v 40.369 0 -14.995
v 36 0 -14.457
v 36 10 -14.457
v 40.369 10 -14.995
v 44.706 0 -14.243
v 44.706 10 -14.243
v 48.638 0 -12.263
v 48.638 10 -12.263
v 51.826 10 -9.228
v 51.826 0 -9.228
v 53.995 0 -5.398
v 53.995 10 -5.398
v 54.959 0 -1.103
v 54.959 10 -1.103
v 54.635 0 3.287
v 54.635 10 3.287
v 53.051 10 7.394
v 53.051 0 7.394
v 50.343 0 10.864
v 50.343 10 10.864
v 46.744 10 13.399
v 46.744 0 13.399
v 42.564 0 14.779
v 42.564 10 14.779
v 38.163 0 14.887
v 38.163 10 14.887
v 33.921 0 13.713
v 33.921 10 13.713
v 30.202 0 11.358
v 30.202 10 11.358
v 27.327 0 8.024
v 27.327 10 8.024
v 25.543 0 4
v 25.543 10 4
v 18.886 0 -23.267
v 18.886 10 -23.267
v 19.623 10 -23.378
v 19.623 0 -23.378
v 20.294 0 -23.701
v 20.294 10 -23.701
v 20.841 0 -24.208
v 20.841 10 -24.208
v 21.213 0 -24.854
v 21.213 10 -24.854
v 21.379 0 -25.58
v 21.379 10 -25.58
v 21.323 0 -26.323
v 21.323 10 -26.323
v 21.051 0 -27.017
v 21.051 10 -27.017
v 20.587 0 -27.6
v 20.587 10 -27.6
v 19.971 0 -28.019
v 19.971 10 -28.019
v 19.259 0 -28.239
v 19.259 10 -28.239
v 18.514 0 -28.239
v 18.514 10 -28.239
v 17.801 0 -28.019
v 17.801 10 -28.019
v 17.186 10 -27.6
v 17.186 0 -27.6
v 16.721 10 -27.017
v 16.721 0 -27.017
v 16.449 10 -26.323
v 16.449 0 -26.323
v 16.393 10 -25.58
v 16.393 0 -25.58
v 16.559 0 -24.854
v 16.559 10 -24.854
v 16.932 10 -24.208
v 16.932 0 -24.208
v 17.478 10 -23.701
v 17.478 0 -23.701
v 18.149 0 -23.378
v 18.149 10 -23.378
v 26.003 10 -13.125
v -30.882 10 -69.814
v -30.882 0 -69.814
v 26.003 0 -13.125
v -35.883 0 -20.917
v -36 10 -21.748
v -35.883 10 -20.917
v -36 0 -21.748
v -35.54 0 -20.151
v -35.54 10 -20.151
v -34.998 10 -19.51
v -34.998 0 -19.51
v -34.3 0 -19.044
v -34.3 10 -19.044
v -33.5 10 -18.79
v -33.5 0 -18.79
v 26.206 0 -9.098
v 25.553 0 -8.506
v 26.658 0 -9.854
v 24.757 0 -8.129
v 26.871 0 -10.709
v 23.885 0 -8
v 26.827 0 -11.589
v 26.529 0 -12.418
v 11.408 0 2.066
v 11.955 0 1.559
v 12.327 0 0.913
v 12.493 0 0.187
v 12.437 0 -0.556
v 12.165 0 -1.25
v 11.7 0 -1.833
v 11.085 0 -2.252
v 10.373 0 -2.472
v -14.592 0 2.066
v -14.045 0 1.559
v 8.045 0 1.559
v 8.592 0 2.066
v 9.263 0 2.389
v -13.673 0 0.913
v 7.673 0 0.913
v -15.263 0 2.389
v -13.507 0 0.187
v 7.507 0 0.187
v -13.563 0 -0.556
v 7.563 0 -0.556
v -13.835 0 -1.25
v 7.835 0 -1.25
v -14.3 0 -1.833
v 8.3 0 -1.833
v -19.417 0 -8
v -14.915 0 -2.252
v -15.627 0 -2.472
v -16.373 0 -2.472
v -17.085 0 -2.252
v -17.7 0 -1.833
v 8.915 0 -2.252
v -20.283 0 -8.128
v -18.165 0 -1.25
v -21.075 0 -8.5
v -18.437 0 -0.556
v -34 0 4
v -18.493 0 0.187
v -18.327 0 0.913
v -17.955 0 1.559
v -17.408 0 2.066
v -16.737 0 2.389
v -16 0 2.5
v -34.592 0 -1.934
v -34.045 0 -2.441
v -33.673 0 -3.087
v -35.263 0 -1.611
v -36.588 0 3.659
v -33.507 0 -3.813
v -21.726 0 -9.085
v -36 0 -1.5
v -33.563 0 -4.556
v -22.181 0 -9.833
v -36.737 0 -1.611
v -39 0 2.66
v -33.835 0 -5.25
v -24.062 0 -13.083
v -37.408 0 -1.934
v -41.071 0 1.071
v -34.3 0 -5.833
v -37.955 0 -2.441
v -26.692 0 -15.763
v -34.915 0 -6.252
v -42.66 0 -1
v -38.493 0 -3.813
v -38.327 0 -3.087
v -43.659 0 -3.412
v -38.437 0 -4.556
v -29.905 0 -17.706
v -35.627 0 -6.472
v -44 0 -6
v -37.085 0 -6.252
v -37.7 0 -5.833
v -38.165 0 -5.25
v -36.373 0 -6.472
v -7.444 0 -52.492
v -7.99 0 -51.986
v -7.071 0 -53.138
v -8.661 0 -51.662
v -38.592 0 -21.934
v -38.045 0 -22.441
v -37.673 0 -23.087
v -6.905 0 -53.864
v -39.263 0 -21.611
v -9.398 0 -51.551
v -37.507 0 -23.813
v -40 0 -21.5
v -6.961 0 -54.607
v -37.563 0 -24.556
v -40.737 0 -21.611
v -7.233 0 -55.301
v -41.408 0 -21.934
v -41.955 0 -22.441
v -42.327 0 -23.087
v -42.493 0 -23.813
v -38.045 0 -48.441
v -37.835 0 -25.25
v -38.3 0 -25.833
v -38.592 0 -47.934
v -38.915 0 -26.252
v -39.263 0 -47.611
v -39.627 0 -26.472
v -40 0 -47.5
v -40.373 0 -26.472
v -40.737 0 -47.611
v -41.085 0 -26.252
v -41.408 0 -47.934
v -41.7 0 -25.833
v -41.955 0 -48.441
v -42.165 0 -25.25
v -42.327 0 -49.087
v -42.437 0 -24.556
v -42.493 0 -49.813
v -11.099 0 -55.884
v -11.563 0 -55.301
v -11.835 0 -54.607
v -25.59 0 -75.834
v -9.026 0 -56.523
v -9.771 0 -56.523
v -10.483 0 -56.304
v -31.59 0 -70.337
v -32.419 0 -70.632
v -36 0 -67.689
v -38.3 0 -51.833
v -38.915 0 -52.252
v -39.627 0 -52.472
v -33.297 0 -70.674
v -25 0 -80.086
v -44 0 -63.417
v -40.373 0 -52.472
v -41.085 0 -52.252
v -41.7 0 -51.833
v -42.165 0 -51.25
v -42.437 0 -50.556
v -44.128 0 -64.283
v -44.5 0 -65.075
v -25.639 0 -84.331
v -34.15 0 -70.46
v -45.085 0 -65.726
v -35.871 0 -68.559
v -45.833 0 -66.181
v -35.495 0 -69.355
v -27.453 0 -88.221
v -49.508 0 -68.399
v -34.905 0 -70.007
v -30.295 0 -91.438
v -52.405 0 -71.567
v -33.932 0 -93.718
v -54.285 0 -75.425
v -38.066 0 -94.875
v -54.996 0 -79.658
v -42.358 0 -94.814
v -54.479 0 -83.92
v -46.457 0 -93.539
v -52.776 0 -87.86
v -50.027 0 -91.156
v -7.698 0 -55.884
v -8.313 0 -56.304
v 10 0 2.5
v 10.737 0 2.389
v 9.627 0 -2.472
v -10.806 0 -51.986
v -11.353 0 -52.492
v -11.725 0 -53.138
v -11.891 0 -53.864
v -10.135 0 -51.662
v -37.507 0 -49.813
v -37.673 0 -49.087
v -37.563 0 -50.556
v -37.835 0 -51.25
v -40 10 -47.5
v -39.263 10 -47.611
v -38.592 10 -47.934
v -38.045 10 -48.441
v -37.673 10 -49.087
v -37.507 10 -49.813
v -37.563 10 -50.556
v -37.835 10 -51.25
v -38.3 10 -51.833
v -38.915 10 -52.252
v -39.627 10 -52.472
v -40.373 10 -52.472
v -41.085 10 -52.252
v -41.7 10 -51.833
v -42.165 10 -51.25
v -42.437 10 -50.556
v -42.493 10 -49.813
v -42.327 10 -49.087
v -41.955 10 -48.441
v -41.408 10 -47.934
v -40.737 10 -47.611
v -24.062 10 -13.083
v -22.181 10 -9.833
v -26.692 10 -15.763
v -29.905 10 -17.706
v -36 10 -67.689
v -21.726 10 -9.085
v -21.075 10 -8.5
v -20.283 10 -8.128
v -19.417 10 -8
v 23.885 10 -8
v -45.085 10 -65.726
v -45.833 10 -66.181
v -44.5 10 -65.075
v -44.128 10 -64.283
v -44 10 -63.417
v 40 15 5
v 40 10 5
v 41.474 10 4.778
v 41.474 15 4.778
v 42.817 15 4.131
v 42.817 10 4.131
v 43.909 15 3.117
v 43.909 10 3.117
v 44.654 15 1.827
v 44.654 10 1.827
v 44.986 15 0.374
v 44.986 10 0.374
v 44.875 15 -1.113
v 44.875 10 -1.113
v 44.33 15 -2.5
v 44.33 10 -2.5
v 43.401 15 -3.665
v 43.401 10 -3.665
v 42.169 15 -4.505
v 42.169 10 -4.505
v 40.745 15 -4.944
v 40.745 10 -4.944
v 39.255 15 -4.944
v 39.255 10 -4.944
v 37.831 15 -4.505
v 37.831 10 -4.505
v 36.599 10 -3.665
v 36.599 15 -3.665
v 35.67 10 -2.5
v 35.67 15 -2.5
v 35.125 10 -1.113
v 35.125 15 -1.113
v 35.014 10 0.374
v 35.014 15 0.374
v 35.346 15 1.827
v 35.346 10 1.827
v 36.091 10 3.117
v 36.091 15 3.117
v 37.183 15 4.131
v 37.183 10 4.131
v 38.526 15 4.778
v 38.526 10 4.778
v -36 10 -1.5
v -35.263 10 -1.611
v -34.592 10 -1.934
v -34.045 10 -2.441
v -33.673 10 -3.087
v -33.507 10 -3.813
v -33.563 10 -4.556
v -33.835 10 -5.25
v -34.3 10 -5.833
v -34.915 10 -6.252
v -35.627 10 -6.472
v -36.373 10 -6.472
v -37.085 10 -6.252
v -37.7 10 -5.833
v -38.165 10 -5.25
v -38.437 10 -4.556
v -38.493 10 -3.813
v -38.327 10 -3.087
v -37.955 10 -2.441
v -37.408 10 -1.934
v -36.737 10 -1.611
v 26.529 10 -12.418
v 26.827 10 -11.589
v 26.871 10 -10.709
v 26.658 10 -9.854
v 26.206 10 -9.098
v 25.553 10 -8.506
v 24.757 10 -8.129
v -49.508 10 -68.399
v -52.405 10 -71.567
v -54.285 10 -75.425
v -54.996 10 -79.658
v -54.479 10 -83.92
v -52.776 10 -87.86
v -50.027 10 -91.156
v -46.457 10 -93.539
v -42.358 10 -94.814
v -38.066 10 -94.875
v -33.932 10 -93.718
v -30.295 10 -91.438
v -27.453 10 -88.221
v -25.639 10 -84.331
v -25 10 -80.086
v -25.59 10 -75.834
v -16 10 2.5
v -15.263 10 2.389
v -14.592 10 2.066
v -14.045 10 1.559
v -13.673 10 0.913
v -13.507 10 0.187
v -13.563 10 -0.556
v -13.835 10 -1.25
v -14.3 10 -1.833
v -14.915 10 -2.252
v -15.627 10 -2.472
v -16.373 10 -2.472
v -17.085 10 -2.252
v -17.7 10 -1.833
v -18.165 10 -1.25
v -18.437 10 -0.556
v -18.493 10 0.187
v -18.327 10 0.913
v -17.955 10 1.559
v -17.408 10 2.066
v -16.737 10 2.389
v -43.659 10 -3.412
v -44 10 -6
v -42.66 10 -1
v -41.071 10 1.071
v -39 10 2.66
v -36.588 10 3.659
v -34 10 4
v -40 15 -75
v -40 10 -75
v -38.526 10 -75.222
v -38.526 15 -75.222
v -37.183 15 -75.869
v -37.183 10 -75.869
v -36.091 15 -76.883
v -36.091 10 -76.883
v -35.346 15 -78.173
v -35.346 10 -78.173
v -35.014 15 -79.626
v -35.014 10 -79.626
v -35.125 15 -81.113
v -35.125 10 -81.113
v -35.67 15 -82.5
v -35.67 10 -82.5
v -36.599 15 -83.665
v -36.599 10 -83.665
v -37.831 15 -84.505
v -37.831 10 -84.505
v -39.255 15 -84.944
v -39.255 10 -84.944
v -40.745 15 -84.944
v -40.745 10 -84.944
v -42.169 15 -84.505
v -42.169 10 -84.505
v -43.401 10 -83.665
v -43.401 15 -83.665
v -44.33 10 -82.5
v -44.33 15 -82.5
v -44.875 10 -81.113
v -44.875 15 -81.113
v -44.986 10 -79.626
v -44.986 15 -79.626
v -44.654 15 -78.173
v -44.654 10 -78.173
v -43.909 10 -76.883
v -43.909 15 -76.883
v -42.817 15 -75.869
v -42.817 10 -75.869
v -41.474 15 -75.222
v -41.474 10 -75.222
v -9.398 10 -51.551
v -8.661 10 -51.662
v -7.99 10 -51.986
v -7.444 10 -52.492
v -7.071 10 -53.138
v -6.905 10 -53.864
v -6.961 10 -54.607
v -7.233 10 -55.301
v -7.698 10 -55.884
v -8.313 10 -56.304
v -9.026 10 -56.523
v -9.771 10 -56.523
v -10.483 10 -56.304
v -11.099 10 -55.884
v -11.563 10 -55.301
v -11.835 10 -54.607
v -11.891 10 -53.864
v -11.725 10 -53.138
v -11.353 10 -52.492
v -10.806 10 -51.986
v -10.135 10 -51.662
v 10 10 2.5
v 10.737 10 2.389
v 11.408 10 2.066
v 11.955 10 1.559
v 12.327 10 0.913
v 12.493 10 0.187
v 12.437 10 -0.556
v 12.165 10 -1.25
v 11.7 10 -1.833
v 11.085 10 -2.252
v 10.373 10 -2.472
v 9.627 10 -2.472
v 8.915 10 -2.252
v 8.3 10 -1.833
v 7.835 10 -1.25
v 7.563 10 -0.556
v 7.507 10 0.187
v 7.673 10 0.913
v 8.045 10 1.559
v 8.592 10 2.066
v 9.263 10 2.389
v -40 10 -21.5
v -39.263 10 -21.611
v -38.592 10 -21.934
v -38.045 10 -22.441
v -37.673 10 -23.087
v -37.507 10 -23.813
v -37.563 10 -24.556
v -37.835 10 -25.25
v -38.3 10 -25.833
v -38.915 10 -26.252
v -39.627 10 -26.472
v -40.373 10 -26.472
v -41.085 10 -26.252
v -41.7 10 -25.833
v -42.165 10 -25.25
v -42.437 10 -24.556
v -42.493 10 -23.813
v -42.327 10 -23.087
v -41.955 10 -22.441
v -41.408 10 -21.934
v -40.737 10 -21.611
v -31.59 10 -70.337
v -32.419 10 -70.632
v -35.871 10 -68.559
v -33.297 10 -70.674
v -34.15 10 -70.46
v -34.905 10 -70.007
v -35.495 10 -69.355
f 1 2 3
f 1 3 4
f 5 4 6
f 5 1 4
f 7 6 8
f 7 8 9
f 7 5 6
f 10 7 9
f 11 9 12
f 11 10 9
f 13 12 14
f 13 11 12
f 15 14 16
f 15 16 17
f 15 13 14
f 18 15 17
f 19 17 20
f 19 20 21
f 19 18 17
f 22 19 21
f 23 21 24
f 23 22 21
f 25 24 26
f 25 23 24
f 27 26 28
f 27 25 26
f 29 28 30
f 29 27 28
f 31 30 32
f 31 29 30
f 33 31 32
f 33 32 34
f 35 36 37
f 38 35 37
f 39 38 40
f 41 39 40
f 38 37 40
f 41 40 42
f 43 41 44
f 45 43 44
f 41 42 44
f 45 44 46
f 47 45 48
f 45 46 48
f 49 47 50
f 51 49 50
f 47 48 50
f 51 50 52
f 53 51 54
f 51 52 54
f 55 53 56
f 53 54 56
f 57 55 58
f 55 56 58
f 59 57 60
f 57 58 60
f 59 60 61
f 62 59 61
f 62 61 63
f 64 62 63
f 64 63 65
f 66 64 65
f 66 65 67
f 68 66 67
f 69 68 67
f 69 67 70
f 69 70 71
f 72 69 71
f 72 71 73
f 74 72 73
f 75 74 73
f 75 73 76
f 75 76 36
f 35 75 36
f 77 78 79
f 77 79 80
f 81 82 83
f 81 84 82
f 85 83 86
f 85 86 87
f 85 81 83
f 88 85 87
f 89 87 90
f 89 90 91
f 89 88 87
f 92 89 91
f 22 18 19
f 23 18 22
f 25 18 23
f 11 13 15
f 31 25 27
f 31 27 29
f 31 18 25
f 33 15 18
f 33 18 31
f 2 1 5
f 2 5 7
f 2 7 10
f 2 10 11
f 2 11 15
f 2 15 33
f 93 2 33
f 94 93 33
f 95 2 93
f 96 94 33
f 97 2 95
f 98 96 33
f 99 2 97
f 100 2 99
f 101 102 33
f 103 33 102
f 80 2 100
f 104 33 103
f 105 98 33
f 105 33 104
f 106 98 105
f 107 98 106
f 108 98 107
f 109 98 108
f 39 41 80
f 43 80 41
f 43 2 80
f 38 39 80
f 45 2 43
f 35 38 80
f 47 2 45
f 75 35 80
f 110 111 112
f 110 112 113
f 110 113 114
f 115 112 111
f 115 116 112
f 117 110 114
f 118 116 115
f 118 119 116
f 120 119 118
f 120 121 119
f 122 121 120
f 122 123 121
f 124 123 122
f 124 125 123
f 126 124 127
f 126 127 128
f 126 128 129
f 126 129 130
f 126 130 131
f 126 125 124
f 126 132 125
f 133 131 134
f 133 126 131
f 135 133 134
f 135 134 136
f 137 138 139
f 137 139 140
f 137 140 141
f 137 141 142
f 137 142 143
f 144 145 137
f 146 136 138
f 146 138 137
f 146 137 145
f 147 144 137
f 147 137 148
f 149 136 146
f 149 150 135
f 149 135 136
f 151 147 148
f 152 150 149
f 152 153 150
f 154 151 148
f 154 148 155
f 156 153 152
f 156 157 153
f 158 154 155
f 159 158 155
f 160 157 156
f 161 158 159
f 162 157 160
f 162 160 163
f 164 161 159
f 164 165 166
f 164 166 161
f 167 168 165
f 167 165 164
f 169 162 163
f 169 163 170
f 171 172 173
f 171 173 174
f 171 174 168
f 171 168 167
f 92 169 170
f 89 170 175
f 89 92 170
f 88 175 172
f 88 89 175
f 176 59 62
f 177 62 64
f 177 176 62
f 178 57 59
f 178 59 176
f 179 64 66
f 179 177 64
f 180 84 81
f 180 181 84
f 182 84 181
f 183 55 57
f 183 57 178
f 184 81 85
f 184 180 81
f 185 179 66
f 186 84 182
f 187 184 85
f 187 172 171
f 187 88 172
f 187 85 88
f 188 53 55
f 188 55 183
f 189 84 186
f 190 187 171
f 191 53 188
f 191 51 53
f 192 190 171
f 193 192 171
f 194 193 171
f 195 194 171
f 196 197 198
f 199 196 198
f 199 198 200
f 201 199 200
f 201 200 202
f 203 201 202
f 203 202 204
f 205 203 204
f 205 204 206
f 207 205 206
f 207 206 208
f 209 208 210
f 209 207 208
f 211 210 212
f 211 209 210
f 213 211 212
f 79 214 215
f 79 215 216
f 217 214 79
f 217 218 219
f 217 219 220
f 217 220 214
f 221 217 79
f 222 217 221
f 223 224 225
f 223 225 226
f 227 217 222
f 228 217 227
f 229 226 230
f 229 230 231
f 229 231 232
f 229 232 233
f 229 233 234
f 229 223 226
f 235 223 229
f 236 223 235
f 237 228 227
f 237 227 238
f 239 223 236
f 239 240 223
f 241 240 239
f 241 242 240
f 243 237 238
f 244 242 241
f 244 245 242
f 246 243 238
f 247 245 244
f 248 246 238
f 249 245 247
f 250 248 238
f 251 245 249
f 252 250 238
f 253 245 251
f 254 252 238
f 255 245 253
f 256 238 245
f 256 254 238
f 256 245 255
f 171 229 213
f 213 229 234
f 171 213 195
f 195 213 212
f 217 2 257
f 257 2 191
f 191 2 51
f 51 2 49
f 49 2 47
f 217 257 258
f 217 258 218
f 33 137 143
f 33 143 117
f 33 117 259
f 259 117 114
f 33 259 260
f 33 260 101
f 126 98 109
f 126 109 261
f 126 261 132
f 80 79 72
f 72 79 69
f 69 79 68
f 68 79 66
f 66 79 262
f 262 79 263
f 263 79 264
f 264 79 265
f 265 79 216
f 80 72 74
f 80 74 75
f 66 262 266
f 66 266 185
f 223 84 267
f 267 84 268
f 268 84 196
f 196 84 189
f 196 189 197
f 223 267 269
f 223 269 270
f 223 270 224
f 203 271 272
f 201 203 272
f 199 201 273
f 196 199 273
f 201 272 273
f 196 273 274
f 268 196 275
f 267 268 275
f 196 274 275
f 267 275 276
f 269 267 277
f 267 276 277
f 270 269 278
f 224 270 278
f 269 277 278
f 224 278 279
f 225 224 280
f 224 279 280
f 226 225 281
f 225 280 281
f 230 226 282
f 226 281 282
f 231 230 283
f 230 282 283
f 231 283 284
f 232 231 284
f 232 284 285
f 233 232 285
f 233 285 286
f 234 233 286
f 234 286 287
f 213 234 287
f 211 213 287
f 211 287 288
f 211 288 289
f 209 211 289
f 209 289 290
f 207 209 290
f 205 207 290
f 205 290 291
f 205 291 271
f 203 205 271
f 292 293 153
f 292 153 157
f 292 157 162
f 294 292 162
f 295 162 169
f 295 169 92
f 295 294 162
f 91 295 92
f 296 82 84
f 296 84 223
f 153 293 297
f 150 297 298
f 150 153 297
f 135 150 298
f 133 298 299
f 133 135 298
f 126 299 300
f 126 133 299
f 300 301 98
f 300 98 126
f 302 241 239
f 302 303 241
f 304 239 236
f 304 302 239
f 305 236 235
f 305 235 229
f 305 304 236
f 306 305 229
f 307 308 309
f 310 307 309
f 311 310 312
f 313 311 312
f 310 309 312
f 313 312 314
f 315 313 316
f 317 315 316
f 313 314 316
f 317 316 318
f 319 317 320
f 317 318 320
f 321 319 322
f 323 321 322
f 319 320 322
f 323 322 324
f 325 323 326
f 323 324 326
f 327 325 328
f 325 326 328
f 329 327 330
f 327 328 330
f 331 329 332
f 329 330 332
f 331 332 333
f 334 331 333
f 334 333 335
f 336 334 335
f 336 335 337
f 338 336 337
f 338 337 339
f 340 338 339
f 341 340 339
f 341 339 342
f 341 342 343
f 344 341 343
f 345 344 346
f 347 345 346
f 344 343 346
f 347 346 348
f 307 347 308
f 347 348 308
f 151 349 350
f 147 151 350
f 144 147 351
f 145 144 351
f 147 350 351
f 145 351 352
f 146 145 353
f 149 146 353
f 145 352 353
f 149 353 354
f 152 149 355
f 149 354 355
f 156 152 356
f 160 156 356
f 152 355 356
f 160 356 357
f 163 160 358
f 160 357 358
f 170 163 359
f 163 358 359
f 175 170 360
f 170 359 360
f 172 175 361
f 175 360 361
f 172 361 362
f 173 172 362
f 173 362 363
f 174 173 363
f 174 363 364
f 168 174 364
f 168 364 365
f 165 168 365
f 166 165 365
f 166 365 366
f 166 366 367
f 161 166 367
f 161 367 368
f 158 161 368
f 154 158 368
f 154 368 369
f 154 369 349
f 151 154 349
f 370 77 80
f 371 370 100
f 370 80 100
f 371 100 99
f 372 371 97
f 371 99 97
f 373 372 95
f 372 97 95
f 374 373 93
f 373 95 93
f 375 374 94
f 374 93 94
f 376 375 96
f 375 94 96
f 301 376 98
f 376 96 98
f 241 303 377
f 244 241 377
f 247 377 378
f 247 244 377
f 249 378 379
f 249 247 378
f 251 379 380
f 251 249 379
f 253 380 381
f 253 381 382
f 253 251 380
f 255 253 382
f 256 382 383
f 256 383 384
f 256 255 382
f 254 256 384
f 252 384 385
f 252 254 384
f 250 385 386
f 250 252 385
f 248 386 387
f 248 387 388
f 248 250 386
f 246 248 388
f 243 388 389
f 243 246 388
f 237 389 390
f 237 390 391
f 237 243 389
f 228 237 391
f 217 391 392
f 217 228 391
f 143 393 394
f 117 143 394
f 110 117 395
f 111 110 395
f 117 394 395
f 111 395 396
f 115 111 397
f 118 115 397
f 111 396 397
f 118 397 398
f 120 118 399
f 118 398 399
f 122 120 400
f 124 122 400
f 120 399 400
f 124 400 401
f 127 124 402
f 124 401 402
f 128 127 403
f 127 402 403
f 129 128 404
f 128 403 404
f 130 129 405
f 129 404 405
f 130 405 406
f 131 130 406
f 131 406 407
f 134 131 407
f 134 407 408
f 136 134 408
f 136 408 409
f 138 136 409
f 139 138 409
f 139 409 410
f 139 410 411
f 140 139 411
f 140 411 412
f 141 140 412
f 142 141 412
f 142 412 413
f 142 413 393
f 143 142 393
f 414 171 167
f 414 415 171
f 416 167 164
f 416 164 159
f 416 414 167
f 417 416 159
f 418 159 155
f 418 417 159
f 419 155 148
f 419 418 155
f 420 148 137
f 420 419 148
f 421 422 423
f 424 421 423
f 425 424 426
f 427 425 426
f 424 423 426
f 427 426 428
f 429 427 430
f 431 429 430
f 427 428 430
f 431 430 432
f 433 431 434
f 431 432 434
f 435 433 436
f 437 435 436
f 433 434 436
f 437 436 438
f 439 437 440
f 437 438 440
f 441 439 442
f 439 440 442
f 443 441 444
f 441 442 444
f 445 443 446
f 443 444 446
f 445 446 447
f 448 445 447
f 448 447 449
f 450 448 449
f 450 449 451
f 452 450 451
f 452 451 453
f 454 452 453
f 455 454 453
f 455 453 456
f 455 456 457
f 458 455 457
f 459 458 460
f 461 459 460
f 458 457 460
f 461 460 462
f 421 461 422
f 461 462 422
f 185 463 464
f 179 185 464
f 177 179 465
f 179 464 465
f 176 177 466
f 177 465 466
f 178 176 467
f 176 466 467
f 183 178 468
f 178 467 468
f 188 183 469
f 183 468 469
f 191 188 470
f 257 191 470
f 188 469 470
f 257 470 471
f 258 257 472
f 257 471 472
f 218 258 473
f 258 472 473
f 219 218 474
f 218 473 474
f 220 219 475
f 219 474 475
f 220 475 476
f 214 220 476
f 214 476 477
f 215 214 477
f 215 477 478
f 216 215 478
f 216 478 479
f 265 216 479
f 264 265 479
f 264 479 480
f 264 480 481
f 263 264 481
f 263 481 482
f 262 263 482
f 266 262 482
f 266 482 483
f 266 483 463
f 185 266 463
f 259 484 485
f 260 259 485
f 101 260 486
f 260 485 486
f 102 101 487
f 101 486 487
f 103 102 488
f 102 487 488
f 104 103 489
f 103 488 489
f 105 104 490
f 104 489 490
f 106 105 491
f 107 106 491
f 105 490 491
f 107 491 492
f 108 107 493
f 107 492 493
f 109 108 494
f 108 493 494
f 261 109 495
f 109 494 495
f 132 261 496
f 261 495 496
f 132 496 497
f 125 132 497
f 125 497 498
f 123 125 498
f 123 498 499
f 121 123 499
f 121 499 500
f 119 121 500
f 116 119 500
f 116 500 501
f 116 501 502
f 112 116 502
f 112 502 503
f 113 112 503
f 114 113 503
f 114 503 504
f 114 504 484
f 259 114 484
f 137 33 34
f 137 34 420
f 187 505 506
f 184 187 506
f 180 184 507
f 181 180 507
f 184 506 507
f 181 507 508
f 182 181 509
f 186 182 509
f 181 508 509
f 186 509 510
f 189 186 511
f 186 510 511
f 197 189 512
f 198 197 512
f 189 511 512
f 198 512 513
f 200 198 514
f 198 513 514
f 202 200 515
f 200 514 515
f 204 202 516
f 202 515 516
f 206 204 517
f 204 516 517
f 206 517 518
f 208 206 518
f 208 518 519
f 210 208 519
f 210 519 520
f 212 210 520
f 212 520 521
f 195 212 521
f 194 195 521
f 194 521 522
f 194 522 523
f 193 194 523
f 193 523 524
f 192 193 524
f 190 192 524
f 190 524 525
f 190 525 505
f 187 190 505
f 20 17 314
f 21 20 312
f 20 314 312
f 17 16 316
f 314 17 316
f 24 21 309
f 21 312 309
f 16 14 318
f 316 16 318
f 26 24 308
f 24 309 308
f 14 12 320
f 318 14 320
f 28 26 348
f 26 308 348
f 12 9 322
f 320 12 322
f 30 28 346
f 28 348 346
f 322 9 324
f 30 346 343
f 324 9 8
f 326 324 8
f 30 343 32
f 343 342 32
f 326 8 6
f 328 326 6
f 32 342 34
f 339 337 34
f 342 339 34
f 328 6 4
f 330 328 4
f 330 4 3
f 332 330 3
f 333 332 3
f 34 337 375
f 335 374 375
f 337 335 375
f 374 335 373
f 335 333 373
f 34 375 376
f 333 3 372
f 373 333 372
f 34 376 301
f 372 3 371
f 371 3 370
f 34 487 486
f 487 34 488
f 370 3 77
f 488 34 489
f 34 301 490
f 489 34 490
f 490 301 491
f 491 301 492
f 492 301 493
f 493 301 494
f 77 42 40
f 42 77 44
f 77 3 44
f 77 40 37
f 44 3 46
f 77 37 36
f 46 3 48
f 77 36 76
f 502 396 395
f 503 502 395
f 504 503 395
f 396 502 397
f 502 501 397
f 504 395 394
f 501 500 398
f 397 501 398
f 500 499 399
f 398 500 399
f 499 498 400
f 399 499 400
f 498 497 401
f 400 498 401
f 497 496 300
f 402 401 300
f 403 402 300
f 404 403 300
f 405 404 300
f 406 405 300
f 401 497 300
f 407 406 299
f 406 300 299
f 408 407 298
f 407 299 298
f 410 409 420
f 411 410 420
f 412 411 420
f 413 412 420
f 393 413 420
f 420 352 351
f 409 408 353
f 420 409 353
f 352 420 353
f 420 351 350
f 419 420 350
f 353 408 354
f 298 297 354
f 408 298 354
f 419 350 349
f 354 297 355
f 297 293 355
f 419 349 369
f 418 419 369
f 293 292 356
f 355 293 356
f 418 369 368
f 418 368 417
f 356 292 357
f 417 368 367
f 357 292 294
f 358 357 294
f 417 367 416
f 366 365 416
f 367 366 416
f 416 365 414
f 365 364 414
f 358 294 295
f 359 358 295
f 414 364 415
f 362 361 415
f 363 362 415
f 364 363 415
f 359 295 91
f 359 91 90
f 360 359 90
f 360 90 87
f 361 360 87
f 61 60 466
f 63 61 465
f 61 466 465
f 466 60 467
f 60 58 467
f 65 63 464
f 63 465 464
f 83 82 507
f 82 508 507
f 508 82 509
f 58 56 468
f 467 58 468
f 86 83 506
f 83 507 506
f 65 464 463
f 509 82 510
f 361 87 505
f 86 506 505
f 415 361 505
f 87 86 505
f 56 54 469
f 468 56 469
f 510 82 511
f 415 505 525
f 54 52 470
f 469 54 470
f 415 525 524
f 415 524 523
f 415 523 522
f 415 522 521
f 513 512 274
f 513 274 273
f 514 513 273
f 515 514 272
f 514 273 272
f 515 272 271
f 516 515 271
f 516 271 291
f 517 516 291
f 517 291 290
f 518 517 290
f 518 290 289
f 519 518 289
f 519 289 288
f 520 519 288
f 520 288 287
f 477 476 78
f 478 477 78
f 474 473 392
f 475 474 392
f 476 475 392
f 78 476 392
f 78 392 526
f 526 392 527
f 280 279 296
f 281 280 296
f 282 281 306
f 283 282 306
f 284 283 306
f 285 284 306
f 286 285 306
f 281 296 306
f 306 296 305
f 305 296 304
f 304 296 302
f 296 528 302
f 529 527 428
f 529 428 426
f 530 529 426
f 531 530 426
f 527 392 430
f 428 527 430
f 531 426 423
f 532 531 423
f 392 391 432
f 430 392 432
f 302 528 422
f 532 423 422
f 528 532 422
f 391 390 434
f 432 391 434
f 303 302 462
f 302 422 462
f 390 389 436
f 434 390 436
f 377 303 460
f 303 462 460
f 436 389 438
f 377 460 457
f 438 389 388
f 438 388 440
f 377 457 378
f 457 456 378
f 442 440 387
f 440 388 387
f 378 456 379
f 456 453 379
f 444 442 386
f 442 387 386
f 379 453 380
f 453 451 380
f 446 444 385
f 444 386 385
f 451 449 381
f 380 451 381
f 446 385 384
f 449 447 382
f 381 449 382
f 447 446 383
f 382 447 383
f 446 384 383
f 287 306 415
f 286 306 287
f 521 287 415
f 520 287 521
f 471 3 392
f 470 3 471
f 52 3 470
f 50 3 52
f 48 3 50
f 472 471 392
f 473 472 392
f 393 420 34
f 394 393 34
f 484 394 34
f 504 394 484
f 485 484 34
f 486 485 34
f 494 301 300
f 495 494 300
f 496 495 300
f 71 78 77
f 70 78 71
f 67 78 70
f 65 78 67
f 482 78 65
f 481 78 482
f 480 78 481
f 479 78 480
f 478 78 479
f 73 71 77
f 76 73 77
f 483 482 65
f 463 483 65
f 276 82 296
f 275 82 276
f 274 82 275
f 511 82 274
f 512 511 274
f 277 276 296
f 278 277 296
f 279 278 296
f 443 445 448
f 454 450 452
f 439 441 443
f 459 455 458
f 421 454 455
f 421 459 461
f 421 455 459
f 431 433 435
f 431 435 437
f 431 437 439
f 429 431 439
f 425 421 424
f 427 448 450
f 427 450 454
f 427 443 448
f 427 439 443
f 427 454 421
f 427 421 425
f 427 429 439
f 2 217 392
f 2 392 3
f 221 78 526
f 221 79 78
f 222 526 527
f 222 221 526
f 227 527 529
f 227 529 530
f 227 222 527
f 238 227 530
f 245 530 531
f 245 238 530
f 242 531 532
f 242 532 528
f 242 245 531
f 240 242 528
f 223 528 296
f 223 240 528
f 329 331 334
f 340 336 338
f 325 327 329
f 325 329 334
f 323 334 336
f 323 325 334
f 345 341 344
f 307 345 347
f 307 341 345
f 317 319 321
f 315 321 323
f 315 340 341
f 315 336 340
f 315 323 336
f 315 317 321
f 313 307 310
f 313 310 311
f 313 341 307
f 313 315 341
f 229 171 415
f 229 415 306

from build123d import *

# Parameters (mm, degrees)
BOSS_EXTRUDE1_DEPTH = 10
SKETCH2_R           = 5
BOSS_EXTRUDE2_DEPTH = 5
SKETCH3_R           = 5
BOSS_EXTRUDE3_DEPTH = 5
SKETCH4_R           = 2.5
CUT_EXTRUDE1_DEPTH  = 111.227038425
SKETCH5_R           = 2.5
CUT_EXTRUDE2_DEPTH  = 111.227038425
SKETCH6_R           = 2.5
CUT_EXTRUDE3_DEPTH  = 111.227038425
SKETCH7_R           = 2.5
CUT_EXTRUDE4_DEPTH  = 111.227038425
SKETCH8_R           = 2.5
CUT_EXTRUDE5_DEPTH  = 111.227038425
CUT_EXTRUDE6_DEPTH  = 111.227038425
FILLET3_R           = 3
SKETCH11_R          = 2.5
CUT_EXTRUDE7_DEPTH  = 111.227038425
SKETCH12_R          = 2.5
CUT_EXTRUDE8_DEPTH  = 111.227038425
FILLET4_R           = 3
FILLET5_R           = 3
FILLET6_R           = 3
FILLET7_R           = 3
FILLET8_R           = 10


with BuildPart() as part:
    # Sketch1 → Boss-Extrude1 (new body)
    with BuildSketch(Plane(origin=(0, 0, 0), x_dir=(1, 0, 0), z_dir=(0, 1, 0))):
        with BuildLine():
            Line((-25.590058181, 75.834237552), (36, 14.456832295))
            ThreePointArc((36, 14.456832295), (53.050951275, -7.394097025), (25.543167705, -4))
            Line((25.543167705, -4), (-44, -4))
            Line((-44, -4), (-44, 65.543167705))
            ThreePointArc((-44, 65.543167705), (-47.31903353, 93.093194728), (-25.590058181, 75.834237552))
        make_face()
    extrude(amount=BOSS_EXTRUDE1_DEPTH)

    # Sketch2 → Boss-Extrude2 (add)
    with BuildSketch(Plane(origin=(0, 10, 0), x_dir=(1, 0, 0), z_dir=(0, 1, 0))):
        with Locations(Location((-40, 80, 0), (0, 0, 270))):
            Circle(SKETCH2_R)
    extrude(amount=BOSS_EXTRUDE2_DEPTH)

    # Sketch3 → Boss-Extrude3 (add)
    with BuildSketch(Plane(origin=(0, 10, 0), x_dir=(1, 0, 0), z_dir=(0, 1, 0))):
        with Locations(Location((40, 0, 0), (0, 0, 270))):
            Circle(SKETCH3_R)
    extrude(amount=BOSS_EXTRUDE3_DEPTH)

    # Sketch4 → Cut-Extrude1 (cut, through all)
    with BuildSketch(Plane(origin=(0, 10, 0), x_dir=(1, 0, 0), z_dir=(0, 1, 0))):
        with Locations(Location((-40, 50, 0), (0, 0, 270))):
            Circle(SKETCH4_R)
    extrude(amount=-CUT_EXTRUDE1_DEPTH, mode=Mode.SUBTRACT)

    # Sketch5 → Cut-Extrude2 (cut, through all)
    with BuildSketch(Plane(origin=(0, 10, 0), x_dir=(1, 0, 0), z_dir=(0, 1, 0))):
        with Locations(Location((-40, 24, 0), (0, 0, 270))):
            Circle(SKETCH5_R)
    extrude(amount=-CUT_EXTRUDE2_DEPTH, mode=Mode.SUBTRACT)

    # Sketch6 → Cut-Extrude3 (cut, through all)
    with BuildSketch(Plane(origin=(0, 10, 0), x_dir=(1, 0, 0), z_dir=(0, 1, 0))):
        with Locations(Location((10, 0, 0), (0, 0, 270))):
            Circle(SKETCH6_R)
    extrude(amount=-CUT_EXTRUDE3_DEPTH, mode=Mode.SUBTRACT)

    # Sketch7 → Cut-Extrude4 (cut, through all)
    with BuildSketch(Plane(origin=(0, 10, 0), x_dir=(1, 0, 0), z_dir=(0, 1, 0))):
        with Locations(Location((-16, 0, 0), (0, 0, 270))):
            Circle(SKETCH7_R)
    extrude(amount=-CUT_EXTRUDE4_DEPTH, mode=Mode.SUBTRACT)

    # Sketch8 → Cut-Extrude5 (cut, through all)
    with BuildSketch(Plane(origin=(0, 10, 0), x_dir=(1, 0, 0), z_dir=(0, 1, 0))):
        with Locations(Location((-36, 4, 0), (0, 0, 270))):
            Circle(SKETCH8_R)
    extrude(amount=-CUT_EXTRUDE5_DEPTH, mode=Mode.SUBTRACT)

    # Sketch10 → Cut-Extrude6 (cut, through all)
    with BuildSketch(Plane(origin=(0, 10, 0), x_dir=(1, 0, 0), z_dir=(0, 1, 0))):
        with BuildLine():
            Line((-36, 74.914042926), (31.145878515, 8))
            Line((31.145878515, 8), (-21.543167705, 8))
            ThreePointArc((-21.543167705, 8), (-26.917048938, 15.937336386), (-36, 19))
            Line((-36, 19), (-36, 74.914042926))
        make_face()
    extrude(amount=-CUT_EXTRUDE6_DEPTH, mode=Mode.SUBTRACT)

    # Fillet3
    fillet3_edges = [part.edges().sort_by_distance(p)[0] for p in [
        (-44, 5, -65.543167705),
    ]]
    fillet(fillet3_edges, radius=FILLET3_R)

    # Sketch11 → Cut-Extrude7 (cut, through all)
    with BuildSketch(Plane(origin=(0, 10, 0), x_dir=(1, 0, 0), z_dir=(0, 1, 0))):
        with Locations(Location((-9.398144918, 54.051141856, 0), (0, 0, 270))):
            Circle(SKETCH11_R)
    extrude(amount=-CUT_EXTRUDE7_DEPTH, mode=Mode.SUBTRACT)

    # Sketch12 → Cut-Extrude8 (cut, through all)
    with BuildSketch(Plane(origin=(0, 10, 0), x_dir=(1, 0, 0), z_dir=(0, 1, 0))):
        with Locations(Location((18.886126329, 25.766870608, 0), (0, 0, 270))):
            Circle(SKETCH12_R)
    extrude(amount=-CUT_EXTRUDE8_DEPTH, mode=Mode.SUBTRACT)

    # Fillet4
    fillet4_edges = [part.edges().sort_by_distance(p)[0] for p in [
        (-36, 5, -74.914042926),
    ]]
    fillet(fillet4_edges, radius=FILLET4_R)

    # Fillet5
    fillet5_edges = [part.edges().sort_by_distance(p)[0] for p in [
        (31.145878515, 5, -8),
    ]]
    fillet(fillet5_edges, radius=FILLET5_R)

    # Fillet6
    fillet6_edges = [part.edges().sort_by_distance(p)[0] for p in [
        (-36, 5, -19),
    ]]
    fillet(fillet6_edges, radius=FILLET6_R)

    # Fillet7
    fillet7_edges = [part.edges().sort_by_distance(p)[0] for p in [
        (-21.543167705, 5, -8),
    ]]
    fillet(fillet7_edges, radius=FILLET7_R)

    # Fillet8
    fillet8_edges = [part.edges().sort_by_distance(p)[0] for p in [
        (-44, 5, 4),
    ]]
    fillet(fillet8_edges, radius=FILLET8_R)


solid = part.part
